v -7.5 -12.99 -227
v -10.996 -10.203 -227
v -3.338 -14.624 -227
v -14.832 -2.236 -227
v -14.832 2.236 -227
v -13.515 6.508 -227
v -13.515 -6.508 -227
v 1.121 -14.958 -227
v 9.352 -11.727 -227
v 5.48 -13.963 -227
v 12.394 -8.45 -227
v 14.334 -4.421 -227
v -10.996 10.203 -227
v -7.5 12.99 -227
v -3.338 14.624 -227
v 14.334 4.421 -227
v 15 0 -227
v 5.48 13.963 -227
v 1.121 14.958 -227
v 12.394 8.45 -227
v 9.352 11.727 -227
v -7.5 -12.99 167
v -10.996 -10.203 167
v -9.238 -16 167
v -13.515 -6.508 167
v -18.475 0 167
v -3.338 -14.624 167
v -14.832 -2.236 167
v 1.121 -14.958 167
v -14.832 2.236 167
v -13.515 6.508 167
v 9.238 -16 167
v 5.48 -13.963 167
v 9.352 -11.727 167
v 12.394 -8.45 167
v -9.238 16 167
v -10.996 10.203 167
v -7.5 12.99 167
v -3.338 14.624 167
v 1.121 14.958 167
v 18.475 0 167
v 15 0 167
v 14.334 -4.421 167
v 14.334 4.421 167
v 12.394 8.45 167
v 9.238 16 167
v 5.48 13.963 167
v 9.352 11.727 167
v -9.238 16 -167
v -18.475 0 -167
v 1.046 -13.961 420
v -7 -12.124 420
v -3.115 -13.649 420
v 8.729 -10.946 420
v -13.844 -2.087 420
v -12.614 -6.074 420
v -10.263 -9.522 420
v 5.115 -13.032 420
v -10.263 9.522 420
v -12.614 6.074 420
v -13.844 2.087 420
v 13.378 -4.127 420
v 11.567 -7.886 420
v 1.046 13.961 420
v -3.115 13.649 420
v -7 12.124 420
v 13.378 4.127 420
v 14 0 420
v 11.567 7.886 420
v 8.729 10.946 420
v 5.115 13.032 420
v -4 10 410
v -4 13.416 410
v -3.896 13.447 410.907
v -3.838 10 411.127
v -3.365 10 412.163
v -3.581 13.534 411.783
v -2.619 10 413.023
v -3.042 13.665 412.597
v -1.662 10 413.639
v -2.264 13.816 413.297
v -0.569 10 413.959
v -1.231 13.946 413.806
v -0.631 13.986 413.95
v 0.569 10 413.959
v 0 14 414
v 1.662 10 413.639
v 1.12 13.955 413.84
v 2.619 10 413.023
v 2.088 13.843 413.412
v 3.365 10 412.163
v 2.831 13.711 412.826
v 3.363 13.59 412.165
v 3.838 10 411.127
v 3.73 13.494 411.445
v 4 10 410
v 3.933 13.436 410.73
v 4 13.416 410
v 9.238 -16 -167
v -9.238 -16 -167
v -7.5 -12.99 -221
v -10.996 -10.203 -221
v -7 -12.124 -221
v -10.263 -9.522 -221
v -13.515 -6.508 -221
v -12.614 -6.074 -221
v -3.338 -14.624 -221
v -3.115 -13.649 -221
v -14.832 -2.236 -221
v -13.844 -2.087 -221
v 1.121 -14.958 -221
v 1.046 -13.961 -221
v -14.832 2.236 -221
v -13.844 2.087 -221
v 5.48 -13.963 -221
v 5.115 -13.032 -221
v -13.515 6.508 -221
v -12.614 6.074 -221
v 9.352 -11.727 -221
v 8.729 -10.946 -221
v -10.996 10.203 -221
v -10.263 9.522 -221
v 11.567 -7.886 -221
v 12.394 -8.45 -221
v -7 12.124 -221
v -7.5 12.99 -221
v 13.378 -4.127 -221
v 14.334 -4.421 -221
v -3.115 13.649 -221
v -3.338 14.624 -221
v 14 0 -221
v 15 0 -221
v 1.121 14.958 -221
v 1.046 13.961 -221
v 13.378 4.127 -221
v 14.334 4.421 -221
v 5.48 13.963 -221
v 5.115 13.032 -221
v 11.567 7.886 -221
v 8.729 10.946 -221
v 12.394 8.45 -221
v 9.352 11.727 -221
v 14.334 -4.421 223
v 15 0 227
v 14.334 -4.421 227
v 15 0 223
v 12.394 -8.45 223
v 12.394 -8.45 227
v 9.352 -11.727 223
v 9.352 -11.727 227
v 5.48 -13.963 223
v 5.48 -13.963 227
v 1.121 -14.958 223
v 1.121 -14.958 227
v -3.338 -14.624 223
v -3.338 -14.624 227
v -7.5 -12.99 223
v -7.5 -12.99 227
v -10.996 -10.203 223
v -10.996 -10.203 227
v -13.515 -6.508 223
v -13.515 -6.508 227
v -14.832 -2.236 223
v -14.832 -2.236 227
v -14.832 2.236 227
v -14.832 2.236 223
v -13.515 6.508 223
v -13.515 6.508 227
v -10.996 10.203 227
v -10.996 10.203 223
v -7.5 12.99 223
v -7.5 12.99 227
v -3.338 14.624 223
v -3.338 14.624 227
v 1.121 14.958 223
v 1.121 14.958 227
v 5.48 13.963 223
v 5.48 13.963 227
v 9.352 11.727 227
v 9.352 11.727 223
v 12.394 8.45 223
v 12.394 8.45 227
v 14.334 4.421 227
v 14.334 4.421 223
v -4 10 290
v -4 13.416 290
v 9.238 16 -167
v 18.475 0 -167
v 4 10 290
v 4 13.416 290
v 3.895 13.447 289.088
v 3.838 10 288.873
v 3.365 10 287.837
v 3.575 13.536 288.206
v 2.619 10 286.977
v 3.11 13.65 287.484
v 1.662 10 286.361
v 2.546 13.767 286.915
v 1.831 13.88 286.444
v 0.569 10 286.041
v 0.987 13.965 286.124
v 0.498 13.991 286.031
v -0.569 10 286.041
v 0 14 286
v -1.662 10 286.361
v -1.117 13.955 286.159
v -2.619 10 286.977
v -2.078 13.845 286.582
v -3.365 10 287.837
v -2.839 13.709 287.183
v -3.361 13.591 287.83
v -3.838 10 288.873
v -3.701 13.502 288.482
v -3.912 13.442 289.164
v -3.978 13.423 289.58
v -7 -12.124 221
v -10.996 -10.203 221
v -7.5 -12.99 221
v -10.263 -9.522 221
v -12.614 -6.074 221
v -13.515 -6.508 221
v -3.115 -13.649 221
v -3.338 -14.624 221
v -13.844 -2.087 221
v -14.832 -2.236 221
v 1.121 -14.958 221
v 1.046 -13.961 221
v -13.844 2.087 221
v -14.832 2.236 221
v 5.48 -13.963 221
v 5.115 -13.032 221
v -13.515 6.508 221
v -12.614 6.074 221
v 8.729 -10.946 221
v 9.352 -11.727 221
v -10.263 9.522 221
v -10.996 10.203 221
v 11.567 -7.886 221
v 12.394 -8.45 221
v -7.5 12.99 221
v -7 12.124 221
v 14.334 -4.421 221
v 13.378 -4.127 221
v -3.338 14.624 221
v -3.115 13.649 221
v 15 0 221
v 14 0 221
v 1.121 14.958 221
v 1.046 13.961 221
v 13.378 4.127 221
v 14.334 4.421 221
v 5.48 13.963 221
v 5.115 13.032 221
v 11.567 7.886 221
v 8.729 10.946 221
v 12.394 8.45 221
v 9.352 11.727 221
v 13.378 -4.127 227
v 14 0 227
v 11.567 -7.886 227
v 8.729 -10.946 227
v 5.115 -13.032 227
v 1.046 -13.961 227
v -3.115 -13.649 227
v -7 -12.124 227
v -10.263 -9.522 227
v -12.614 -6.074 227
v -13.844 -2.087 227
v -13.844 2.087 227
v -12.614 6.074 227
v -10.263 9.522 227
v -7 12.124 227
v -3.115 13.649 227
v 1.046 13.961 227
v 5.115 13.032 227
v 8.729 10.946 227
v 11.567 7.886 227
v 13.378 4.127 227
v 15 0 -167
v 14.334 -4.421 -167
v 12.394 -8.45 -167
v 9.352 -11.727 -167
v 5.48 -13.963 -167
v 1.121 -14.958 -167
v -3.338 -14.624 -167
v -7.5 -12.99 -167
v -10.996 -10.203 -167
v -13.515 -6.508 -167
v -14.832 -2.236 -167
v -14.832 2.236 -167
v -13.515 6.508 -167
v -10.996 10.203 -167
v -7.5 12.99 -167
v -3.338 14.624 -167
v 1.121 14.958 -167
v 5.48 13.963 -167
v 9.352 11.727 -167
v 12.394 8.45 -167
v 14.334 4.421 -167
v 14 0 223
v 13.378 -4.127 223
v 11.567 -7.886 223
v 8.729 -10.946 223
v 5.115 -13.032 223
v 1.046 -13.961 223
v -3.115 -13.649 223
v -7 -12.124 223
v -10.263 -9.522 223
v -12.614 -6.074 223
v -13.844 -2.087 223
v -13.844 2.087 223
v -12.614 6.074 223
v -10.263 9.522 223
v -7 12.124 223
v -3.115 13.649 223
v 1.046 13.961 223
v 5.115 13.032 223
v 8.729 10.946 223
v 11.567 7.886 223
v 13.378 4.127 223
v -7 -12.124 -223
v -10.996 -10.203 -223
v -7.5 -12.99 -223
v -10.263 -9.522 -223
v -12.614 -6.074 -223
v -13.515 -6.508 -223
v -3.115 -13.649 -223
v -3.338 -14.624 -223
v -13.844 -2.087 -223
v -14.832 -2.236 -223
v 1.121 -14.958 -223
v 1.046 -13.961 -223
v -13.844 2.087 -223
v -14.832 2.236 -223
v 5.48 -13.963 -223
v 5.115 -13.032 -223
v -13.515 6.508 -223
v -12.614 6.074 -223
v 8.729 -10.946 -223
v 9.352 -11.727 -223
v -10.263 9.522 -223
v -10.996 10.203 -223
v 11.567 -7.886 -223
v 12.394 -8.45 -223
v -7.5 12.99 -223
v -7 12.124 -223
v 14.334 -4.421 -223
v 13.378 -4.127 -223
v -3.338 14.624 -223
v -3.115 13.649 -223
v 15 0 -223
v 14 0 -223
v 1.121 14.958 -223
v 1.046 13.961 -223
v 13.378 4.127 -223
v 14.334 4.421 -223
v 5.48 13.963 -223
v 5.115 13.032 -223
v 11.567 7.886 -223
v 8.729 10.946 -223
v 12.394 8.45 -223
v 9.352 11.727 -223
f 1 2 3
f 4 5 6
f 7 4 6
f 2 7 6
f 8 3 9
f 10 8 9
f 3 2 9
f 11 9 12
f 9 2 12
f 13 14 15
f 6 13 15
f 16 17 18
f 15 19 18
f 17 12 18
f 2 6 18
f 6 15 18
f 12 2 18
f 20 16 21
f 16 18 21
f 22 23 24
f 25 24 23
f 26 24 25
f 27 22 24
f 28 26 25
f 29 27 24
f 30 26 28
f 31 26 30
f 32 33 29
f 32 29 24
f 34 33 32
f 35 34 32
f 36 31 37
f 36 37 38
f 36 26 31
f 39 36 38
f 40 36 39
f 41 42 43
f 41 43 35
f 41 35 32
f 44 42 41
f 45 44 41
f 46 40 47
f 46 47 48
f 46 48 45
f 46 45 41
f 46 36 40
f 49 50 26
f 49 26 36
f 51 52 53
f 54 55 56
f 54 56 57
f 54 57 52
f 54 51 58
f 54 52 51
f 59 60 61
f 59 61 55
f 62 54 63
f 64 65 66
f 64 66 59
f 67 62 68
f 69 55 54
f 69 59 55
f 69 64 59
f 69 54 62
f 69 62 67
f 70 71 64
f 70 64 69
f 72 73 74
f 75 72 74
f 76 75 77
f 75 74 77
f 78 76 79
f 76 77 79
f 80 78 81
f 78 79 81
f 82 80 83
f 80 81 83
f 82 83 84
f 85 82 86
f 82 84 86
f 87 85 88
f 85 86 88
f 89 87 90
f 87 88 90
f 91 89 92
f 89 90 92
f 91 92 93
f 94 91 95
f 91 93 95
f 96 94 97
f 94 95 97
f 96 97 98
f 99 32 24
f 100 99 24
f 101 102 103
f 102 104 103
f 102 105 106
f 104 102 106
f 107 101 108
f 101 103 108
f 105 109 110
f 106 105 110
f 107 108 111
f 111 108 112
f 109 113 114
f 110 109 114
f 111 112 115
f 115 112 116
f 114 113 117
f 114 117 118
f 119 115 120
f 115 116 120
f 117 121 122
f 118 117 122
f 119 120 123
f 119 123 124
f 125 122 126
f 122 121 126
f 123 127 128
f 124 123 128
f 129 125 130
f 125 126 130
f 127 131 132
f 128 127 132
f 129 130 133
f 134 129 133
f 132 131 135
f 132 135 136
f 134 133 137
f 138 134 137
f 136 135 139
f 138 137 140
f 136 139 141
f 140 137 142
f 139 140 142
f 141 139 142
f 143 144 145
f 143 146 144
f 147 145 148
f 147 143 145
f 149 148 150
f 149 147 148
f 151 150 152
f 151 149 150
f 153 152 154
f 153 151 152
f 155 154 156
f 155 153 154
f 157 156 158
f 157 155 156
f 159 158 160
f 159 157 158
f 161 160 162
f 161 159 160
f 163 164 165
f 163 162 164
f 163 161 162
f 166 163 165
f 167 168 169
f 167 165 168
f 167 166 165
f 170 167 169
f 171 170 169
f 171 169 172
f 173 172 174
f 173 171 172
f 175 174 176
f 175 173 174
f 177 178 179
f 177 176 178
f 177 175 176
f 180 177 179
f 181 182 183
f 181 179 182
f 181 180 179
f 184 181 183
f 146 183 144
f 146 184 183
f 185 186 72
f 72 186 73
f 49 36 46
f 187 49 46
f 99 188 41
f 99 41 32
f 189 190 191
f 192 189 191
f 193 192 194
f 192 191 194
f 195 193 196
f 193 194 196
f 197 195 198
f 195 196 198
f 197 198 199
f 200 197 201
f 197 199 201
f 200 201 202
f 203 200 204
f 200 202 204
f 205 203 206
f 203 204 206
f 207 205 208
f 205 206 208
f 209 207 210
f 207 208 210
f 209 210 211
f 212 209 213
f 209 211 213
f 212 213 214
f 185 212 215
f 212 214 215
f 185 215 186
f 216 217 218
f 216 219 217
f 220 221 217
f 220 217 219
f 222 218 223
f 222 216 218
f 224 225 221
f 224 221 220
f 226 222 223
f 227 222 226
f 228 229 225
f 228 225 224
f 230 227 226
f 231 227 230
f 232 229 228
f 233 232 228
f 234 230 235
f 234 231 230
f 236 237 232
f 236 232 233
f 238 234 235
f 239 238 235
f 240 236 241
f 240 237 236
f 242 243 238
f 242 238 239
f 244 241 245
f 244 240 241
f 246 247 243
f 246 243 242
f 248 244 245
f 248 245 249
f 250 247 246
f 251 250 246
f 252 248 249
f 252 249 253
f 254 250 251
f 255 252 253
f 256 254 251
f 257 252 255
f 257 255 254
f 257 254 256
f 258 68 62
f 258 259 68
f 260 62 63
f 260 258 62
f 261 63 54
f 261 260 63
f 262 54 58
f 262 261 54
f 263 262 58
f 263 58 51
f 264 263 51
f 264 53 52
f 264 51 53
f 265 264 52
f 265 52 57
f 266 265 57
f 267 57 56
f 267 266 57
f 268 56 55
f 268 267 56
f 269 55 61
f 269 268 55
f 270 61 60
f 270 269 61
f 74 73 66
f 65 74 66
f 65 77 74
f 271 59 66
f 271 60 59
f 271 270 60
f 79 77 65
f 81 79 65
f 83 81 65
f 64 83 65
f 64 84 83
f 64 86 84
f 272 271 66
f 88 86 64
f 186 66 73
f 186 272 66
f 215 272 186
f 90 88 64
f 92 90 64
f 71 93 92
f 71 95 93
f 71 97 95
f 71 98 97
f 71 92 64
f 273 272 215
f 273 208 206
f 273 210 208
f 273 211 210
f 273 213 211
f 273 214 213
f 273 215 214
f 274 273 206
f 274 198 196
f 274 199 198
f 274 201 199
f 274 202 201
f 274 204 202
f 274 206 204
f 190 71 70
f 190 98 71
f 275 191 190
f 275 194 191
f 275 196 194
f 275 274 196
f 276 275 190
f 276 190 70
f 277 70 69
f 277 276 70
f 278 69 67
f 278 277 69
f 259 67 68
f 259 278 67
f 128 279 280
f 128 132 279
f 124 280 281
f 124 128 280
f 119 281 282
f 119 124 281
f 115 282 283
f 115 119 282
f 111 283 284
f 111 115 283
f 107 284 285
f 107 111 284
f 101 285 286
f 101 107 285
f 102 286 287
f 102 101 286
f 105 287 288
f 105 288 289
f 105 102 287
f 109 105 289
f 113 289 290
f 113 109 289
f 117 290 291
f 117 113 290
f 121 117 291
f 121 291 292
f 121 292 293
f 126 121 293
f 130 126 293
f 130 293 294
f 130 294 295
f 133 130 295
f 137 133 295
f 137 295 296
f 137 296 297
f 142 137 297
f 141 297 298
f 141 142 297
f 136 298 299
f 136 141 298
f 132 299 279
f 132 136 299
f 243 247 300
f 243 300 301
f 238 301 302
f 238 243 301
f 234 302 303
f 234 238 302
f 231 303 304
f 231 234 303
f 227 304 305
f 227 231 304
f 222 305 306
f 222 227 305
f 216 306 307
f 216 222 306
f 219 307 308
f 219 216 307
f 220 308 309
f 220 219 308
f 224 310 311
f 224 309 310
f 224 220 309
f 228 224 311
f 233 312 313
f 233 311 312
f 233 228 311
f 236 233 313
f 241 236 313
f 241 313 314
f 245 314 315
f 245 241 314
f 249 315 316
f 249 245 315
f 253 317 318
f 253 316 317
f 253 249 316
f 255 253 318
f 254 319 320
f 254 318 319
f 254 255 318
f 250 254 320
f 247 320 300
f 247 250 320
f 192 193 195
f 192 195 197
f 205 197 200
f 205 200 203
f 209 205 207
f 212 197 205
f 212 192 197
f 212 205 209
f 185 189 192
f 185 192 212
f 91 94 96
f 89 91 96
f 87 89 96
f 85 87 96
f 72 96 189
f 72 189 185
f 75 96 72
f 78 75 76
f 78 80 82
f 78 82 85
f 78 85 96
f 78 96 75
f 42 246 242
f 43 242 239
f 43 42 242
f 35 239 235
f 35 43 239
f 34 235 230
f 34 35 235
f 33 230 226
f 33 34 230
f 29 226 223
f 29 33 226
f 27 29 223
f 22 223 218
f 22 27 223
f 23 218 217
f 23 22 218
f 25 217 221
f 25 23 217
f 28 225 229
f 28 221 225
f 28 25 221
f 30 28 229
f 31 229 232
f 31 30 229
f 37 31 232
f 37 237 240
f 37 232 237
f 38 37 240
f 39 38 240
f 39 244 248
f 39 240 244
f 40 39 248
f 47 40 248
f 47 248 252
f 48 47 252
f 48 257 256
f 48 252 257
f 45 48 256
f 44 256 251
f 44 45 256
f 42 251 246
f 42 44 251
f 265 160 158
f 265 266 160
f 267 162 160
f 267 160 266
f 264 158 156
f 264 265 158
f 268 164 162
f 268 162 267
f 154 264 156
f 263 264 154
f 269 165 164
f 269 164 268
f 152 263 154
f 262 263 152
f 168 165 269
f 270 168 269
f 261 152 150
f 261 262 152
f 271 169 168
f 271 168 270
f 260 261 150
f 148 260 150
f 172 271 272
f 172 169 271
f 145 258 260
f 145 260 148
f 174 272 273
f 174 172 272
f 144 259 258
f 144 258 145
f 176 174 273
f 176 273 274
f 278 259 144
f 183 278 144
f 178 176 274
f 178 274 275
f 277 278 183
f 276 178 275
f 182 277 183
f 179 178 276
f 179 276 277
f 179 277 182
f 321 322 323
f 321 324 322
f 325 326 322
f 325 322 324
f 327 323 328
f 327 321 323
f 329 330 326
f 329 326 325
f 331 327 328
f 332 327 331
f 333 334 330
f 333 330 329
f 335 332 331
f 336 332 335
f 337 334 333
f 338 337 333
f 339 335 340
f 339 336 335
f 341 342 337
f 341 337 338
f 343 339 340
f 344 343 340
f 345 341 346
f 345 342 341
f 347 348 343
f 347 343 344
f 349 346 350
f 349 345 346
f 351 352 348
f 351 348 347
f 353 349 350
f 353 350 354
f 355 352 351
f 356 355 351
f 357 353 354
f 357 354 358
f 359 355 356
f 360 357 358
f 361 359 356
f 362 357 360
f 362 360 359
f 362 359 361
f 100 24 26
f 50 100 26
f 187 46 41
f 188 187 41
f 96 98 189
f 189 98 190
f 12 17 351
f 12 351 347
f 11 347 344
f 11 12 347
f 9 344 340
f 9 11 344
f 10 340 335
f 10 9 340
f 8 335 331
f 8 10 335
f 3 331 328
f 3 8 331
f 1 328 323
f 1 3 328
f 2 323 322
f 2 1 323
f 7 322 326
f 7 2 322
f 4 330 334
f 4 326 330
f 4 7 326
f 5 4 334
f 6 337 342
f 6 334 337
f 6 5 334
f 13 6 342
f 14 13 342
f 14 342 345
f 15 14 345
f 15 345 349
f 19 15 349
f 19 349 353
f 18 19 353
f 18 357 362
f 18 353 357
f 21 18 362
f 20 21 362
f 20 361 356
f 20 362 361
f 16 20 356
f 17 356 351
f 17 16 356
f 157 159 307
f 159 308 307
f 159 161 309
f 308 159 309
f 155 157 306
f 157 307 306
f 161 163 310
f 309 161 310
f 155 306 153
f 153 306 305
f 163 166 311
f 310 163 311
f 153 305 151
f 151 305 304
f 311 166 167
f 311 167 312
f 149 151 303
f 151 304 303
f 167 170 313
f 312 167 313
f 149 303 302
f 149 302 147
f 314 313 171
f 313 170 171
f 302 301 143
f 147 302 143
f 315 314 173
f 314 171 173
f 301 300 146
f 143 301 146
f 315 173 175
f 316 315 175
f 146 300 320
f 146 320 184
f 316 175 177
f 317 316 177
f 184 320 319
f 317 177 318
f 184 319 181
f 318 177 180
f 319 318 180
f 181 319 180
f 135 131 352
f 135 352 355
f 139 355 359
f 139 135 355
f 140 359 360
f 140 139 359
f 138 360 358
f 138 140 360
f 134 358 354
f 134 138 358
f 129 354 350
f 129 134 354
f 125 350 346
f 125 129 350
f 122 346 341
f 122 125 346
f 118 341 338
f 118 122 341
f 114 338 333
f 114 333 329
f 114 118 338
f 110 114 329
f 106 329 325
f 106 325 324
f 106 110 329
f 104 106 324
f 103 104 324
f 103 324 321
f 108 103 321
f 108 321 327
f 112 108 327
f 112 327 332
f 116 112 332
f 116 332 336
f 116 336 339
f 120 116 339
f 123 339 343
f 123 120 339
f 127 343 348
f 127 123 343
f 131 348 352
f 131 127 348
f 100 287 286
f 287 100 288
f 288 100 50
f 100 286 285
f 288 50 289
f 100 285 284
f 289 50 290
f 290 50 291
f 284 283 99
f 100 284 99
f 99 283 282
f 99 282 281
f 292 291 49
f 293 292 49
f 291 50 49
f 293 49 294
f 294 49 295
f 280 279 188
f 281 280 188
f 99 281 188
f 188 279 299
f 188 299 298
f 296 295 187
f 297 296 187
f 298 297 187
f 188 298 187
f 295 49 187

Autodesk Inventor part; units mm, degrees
ref_plane "YZ Plane" through (0, 0, 0) normal (1, 0, 0) x (0, 1, 0)
ref_plane "XY Plane" through (0, 0, 0) normal (0, 0, 1) x (1, 0, 0)
sketch "Sketch1" plane through (0, 0, 0) normal (0, 0, 1) x (1, 0, 0)
  line L0 (-9.2376, -16) -> (-18.4752, 0)
  line L1 (-18.4752, 0) -> (-9.2376, 16)
  line L2 (-9.2376, 16) -> (9.2376, 16)
  line L3 (9.2376, 16) -> (18.4752, 0)
  line L4 (18.4752, 0) -> (9.2376, -16)
  line L5 (9.2376, -16) -> (-9.2376, -16)
  point P0 (0, 0)
  point P1 (0, 0)
  dimension "d0" = 32
extrude "Extrusion1" add sketch "Sketch1" along normal mid plane 334
sketch "Sketch3" plane through (0, 0, 0) normal (0, 1, 0) x (-1, 0, 0)
  line L0 (0, -227) -> (0, 0)
  line L1 (0, 0) -> (0, 420)
  line L2 (0, 420) -> (-14, 420)
  line L3 (-14, 420) -> (-14, 227)
  line L4 (-14, 227) -> (-15, 227)
  line L5 (-15, 227) -> (-15, 0)
  line L6 (-15, 0) -> (-15, -227)
  line L7 (-15, -227) -> (0, -227)
  line L8 (-15, -223) -> (-14, -223)
  line L9 (-14, -223) -> (-14, -221)
  line L10 (-14, -221) -> (-15, -221)
  line L11 (-15, -221) -> (-15, -223)
  line L12 (-14, 416) -> (-13, 416)
  line L13 (-13, 416) -> (-13, 414)
  line L14 (-13, 414) -> (-14, 414)
  line L15 (-14, 414) -> (-14, 416)
  line L16 (-15, 223) -> (-14, 223)
  line L17 (-14, 223) -> (-14, 221)
  line L18 (-14, 221) -> (-15, 221)
  line L19 (-15, 221) -> (-15, 223)
  point P0 (-15, 221)
  dimension "d8" = 30
  dimension "d9" = 227
  dimension "d10" = 420
  dimension "d12" = 28
  dimension "d14" = 4
  dimension "d15" = 2
  dimension "d16" = 26
  dimension "d17" = 2
  dimension "d18" = 4
  dimension "d19" = 28
  dimension "d20" = 227
  dimension "d21" = 2
  dimension "d22" = 4
  dimension "d23" = 28
revolve "Revolution1" add sketch "Sketch3" angle 360 about axis through (0, 0, -227) along (0, 0, 1) contours L7 L6 L8 L9 L10 L5 L18 L17 L16 L4 L3 L14 L13 L12 L2 L1 L0 | L12 L13 L14 L3
ref_plane "Work Plane1" through (0, 14, 323.5) normal (0, 1, 0) x (-1, 0, 0)
sketch "Sketch4" plane through (0, 14, 323.5) normal (0, 1, 0) x (-1, 0, 0)
  line L0 (14, -96.5) -> (-14, -96.5) construction
  line L1 (14, 96.5) -> (-14, 96.5) construction
  line L2 (0, 86.5) -> (0, -33.5) construction
  line L3 (-4, 86.5) -> (-4, -33.5)
  line L4 (4, -33.5) -> (4, 86.5)
  arc A0 (4, 86.5) -> (-4, 86.5) centre (0, 86.5) ccw
  arc A1 (-4, -33.5) -> (4, -33.5) centre (0, -33.5) ccw
  point P0 (0, -323.5)
  point P1 (0, 26.5)
  point P2 (0, 96.5)
  dimension "d24" = 8
  dimension "d25" = 10
  dimension "d26" = 120
extrude "Extrusion3" cut sketch "Sketch4" against normal blind 4
equation "\"d23\" = d19"
properties part number "NVPH-201 shredder shaft"
